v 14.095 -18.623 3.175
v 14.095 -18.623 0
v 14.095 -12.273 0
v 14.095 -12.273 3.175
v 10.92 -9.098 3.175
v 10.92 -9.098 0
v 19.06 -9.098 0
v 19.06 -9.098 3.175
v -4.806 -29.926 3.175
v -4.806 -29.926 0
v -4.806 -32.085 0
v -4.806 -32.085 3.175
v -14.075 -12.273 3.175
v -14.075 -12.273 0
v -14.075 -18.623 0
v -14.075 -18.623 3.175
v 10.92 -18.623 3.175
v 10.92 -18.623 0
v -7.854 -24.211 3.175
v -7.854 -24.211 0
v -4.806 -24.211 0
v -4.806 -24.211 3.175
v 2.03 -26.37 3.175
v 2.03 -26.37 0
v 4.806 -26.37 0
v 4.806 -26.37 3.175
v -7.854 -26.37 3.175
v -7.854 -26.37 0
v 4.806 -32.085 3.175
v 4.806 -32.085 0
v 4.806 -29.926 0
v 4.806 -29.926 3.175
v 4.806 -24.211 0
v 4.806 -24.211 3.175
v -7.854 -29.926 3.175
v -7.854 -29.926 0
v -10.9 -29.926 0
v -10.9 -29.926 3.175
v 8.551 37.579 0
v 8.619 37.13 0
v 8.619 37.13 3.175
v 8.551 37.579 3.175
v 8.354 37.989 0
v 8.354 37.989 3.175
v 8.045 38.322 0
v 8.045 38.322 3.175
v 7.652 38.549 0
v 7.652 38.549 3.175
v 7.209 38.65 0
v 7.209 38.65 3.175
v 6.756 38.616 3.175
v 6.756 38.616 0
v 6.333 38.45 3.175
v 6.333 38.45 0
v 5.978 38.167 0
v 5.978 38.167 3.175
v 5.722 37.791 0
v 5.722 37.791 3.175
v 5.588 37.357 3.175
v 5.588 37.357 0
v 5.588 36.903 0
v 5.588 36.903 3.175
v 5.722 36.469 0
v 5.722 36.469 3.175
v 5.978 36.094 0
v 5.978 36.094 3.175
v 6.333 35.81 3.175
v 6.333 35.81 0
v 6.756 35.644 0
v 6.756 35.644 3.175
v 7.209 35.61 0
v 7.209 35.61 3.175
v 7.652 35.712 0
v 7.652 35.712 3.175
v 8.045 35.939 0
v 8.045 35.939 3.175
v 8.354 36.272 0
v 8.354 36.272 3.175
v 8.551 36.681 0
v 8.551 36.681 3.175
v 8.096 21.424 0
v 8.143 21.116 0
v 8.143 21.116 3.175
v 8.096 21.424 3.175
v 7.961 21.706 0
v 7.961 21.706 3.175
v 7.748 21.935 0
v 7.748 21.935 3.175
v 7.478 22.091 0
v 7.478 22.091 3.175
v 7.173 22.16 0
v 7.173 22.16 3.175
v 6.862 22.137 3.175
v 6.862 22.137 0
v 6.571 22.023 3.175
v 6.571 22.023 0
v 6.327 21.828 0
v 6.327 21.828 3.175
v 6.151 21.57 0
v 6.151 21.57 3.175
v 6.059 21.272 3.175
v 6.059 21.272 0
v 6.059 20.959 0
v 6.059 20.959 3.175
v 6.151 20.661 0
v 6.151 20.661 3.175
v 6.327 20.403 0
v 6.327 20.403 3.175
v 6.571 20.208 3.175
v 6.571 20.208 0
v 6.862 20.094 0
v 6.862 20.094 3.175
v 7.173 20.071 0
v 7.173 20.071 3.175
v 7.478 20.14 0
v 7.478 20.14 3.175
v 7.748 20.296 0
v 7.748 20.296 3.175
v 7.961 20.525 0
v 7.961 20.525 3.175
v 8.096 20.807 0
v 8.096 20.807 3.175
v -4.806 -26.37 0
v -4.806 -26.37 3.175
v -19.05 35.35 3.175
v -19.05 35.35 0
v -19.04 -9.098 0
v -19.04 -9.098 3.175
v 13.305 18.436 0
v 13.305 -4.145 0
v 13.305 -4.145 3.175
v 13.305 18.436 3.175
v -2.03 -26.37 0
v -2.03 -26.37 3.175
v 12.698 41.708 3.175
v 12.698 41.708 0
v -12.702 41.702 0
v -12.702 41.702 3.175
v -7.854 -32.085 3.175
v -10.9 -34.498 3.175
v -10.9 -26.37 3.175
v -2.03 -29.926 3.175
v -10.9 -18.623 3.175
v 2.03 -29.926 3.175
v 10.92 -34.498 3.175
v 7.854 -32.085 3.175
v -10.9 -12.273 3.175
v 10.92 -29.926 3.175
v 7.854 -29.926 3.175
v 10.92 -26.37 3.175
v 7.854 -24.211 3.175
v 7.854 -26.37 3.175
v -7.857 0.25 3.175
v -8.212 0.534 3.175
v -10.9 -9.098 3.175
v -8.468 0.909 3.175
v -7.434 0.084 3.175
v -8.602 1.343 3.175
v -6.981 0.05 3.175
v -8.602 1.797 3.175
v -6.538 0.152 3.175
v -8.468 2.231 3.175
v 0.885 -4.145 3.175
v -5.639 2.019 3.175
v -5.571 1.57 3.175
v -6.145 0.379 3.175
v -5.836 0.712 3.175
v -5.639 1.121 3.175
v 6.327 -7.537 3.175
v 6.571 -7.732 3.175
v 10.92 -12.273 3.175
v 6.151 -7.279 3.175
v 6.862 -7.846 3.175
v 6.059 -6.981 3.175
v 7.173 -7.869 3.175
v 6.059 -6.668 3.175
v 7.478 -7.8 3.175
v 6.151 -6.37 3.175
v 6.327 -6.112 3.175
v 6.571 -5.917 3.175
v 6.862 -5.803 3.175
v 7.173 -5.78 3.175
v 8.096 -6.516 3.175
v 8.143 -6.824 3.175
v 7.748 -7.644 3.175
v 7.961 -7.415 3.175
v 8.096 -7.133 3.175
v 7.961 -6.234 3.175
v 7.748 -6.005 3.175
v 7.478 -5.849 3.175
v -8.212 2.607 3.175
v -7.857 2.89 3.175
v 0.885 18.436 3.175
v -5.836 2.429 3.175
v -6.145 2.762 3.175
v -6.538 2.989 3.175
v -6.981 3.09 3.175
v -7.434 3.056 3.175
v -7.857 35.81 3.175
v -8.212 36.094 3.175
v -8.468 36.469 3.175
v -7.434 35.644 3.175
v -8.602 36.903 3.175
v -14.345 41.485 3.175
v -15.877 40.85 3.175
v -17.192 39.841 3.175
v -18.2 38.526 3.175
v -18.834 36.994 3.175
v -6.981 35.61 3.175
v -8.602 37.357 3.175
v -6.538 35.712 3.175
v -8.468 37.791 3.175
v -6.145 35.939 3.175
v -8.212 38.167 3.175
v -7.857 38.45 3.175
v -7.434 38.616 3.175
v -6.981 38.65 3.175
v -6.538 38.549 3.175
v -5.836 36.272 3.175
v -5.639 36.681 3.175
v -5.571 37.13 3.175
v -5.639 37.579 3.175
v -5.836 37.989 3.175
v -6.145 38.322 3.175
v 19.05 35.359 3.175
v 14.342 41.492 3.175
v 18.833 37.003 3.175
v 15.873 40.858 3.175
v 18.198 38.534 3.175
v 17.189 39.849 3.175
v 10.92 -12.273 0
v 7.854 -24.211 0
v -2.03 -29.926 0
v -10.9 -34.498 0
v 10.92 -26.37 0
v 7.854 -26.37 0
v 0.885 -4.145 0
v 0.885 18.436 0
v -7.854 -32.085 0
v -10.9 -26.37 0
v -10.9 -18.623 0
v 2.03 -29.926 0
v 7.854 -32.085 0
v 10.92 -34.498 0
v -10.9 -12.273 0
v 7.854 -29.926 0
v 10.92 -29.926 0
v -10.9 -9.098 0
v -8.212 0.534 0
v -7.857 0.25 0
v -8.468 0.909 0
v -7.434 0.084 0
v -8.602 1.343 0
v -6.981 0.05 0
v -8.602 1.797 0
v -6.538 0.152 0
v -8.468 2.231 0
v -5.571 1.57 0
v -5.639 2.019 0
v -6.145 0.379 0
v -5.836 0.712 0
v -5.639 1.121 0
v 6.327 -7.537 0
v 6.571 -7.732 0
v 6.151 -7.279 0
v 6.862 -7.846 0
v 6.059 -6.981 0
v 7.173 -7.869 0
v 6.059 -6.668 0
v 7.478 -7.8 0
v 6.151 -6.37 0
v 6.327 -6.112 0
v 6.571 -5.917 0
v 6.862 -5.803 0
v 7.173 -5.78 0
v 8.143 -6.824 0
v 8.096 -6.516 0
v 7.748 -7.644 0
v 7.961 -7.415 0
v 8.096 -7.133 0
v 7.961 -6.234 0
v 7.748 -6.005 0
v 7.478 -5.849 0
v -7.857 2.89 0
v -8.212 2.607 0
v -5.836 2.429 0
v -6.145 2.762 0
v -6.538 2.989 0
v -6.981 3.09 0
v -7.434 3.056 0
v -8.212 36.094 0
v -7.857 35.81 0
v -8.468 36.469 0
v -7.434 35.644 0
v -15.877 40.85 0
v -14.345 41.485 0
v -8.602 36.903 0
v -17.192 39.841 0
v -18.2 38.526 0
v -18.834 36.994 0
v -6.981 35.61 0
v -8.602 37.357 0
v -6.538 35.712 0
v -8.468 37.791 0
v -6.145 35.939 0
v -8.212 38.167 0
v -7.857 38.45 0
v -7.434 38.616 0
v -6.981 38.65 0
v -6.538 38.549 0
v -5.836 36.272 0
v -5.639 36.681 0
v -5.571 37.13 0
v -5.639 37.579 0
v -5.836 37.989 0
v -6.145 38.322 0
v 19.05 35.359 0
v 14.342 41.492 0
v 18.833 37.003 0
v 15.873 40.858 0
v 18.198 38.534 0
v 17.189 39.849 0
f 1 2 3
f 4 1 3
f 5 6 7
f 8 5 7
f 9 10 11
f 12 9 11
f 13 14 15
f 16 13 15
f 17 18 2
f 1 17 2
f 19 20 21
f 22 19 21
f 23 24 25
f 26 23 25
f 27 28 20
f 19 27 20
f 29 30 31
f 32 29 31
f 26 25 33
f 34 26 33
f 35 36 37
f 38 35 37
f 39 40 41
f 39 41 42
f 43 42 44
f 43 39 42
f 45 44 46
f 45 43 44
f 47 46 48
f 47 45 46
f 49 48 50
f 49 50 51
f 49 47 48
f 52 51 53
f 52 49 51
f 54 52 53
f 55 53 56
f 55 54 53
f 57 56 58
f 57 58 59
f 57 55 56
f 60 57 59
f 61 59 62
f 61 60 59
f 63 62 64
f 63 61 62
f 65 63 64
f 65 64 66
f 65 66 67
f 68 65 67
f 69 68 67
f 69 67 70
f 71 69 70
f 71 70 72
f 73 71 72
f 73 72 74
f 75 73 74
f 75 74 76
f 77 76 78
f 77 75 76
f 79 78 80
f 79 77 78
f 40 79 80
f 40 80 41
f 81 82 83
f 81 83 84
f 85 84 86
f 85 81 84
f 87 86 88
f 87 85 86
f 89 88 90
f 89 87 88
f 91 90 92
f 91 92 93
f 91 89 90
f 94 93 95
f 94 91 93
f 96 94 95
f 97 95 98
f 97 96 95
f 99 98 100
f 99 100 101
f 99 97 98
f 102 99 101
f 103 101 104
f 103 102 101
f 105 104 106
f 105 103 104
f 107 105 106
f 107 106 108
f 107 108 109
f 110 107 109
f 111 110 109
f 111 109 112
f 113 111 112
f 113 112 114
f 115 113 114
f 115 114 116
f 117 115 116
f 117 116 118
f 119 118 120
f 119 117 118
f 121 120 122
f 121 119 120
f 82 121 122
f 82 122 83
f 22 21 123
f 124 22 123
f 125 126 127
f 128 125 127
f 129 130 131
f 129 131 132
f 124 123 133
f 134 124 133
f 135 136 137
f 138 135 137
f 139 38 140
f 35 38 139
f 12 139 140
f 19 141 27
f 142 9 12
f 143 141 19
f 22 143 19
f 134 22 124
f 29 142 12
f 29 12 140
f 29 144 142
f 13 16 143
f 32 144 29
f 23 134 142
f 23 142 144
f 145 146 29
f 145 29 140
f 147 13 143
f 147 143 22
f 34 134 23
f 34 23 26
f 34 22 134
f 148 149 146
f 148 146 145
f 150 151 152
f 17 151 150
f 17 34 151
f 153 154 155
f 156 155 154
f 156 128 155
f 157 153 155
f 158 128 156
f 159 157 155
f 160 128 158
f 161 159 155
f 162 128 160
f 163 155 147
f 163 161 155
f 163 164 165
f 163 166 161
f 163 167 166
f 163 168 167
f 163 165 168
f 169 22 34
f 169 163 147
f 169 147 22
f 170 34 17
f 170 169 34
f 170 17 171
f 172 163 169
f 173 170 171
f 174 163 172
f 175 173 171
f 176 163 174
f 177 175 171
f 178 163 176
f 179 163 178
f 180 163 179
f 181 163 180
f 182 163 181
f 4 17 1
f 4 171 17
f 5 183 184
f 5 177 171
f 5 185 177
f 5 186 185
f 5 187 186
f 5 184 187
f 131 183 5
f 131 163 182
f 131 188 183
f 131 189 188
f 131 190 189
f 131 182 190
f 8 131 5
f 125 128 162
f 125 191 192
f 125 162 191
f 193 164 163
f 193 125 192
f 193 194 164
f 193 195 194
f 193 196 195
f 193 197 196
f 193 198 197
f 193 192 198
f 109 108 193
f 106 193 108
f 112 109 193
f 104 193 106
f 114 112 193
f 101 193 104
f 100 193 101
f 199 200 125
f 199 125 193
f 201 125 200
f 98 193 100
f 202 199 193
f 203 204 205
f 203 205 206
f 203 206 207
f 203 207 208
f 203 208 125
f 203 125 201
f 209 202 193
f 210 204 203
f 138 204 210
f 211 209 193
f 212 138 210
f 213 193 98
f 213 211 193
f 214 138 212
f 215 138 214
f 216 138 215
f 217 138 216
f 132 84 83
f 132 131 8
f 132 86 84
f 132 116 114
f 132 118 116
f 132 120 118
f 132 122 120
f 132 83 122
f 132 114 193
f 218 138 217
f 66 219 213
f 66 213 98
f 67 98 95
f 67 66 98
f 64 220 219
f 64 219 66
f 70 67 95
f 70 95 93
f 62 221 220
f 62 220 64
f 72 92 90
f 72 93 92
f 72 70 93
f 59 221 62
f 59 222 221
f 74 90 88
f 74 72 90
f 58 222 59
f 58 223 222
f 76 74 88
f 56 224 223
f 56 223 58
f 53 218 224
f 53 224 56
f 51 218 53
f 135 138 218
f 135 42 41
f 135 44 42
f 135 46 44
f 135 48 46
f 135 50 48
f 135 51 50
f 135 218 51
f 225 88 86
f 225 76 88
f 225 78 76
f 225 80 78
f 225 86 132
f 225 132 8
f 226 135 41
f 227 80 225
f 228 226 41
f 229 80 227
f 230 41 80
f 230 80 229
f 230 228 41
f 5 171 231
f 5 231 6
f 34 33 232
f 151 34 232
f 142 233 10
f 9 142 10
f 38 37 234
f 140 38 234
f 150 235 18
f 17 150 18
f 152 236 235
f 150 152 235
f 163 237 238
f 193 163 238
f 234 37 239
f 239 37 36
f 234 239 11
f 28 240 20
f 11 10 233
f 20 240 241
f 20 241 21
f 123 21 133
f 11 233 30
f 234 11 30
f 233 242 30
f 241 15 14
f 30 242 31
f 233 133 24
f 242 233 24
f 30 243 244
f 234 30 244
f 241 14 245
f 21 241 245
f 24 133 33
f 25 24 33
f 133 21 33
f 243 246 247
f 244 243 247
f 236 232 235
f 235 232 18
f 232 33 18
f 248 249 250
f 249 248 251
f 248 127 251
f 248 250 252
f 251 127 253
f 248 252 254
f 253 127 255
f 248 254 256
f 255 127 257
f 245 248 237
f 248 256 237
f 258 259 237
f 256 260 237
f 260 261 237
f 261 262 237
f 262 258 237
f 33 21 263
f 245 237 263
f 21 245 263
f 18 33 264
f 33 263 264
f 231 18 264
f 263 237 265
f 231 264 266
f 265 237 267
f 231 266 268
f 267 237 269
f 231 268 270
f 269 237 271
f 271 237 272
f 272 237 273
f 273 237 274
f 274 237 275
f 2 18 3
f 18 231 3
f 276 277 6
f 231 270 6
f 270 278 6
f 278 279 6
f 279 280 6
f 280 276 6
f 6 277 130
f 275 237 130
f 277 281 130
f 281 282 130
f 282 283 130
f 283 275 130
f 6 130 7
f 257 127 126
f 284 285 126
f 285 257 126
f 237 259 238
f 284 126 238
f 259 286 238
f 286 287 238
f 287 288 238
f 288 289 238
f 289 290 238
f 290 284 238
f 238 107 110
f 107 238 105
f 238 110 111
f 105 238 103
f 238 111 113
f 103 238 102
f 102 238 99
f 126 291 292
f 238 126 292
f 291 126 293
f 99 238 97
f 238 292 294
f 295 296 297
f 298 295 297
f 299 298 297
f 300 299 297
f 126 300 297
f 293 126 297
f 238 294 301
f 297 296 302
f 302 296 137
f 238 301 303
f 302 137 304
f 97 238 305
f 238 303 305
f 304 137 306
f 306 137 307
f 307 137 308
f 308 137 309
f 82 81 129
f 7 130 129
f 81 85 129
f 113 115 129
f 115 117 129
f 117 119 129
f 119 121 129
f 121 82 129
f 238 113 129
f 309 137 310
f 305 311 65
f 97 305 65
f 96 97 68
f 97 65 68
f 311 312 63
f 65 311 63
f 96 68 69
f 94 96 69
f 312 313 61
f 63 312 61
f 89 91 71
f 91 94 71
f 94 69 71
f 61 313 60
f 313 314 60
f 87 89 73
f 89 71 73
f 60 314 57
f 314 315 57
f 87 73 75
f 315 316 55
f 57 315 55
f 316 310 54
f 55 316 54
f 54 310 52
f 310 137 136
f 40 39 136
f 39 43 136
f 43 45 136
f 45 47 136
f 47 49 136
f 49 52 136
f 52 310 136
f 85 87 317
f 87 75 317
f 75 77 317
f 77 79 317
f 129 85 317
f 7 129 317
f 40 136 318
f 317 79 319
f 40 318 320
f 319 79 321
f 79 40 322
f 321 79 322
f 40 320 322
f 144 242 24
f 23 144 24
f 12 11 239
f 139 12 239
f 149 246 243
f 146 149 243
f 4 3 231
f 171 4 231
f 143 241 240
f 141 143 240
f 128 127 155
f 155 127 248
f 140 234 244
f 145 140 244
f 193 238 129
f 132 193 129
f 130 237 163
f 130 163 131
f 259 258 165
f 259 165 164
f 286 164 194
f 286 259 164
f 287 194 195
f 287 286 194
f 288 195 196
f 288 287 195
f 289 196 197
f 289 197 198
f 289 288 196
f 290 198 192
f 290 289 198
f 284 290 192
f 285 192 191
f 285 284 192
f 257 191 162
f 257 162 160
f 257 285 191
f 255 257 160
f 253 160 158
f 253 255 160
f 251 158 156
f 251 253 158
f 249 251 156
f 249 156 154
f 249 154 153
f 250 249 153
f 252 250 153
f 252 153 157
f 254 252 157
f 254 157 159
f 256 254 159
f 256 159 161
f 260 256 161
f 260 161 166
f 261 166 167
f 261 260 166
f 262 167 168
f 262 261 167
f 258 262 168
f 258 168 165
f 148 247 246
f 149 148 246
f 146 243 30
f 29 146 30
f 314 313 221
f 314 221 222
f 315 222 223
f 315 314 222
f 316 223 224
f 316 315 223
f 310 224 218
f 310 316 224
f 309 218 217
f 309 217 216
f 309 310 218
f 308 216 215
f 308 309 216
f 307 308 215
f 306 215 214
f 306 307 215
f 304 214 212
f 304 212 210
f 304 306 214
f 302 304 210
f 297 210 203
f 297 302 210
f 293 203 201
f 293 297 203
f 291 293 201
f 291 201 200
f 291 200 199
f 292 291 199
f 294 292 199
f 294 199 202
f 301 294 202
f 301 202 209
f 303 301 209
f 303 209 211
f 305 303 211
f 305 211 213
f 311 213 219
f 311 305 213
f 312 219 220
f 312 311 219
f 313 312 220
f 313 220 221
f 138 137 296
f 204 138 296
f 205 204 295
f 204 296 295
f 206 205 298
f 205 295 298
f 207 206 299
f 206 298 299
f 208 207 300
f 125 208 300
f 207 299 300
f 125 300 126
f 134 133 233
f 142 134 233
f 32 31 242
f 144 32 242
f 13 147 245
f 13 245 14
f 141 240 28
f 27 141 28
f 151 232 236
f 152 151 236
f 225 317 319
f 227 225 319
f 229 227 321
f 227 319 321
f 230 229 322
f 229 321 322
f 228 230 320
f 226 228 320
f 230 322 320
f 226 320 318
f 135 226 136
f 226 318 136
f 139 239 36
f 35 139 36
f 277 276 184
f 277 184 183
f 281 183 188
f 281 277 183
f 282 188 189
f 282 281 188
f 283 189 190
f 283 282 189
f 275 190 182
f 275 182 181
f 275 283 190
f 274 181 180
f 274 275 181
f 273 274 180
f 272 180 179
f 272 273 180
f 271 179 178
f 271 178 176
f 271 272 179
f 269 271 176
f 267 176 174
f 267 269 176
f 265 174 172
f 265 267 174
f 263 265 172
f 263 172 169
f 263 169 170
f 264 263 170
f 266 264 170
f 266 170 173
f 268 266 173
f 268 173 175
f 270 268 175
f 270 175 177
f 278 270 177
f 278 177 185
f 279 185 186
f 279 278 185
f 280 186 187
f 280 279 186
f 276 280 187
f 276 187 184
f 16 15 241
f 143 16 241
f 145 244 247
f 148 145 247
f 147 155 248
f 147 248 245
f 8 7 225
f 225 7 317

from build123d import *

# Parameters (mm, degrees)
F0_R     = 1.524
F0_R_2   = 1.04775
F0_W     = 12.4206
F0_H     = 22.5806
F1_DEPTH = 3.175


# Not quite as in the source:
# - ends of sketch curves that miss each other by under 0.0002 mm in the source are joined
# - a length typed as a fraction of an inch, garbled in the dataset ("3 / 203.2 mm" for 3/8 in), is restored


with BuildPart() as f1:
    # F0 (on Top) → F1 (new body)
    with BuildSketch(Plane.XY):
        with BuildLine():
            ThreePointArc((19.0496193061, 35.359281088), (17.1886928512, 39.8489739211), (12.6981263868, 41.7077912426))
            Line((12.6981263868, 41.7077912426), (-12.7018729111, 41.7018188664))
            ThreePointArc((-12.7018729111, 41.7018188664), (-17.19156232, 39.8408924124), (-19.0503796423, 35.3503293721))
            Line((-19.0503796423, 35.3503293721), (-19.0399523971, -9.0977780687))
            Line((-19.0399523971, -9.0977780687), (-10.8996863639, -9.0977780687))
            Line((-10.8996863639, -9.0977780687), (-10.8996863639, -12.2727780687))
            Line((-10.8996863639, -12.2727780687), (-14.0746863639, -12.2727780687))
            Line((-14.0746863639, -12.2727780687), (-14.0746863639, -18.6227780687))
            Line((-14.0746863639, -18.6227780687), (-10.8996939729, -18.6227780687))
            Line((-10.8996939729, -18.6227780687), (-10.8996939729, -26.3697780687))
            Line((-10.8996939729, -26.3697780687), (-7.8538059598, -26.3697780687))
            Line((-7.8538059598, -26.3697780687), (-7.8538059598, -24.2107780687))
            Line((-7.8538059598, -24.2107780687), (-4.8058059598, -24.2107780687))
            Line((-4.8058059598, -24.2107780687), (-4.8058059598, -26.3697780687))
            Line((-4.8058059598, -26.3697780687), (-2.0297826182, -26.3697780687))
            Line((-2.0297826182, -26.3697780687), (-2.0297826182, -29.9257780687))
            Line((-2.0297826182, -29.9257780687), (-4.8058059598, -29.9257780687))
            Line((-4.8058059598, -29.9257780687), (-4.8058059598, -32.0847780687))
            Line((-4.8058059598, -32.0847780687), (-7.8538059598, -32.0847780687))
            Line((-7.8538059598, -32.0847780687), (-7.8538059598, -29.9257780687))
            Line((-7.8538059598, -29.9257780687), (-10.8996939729, -29.9257780687))
            Line((-10.8996939729, -29.9257780687), (-10.8996939729, -34.4977780687))
            Line((-10.8996939729, -34.4977780687), (10.9197826182, -34.4977780687))
            Line((10.9197826182, -34.4977780687), (10.9197826182, -29.9257780687))
            Line((10.9197826182, -29.9257780687), (7.8538059598, -29.9257780687))
            Line((7.8538059598, -29.9257780687), (7.8538059598, -32.0847780687))
            Line((7.8538059598, -32.0847780687), (4.8058059598, -32.0847780687))
            Line((4.8058059598, -32.0847780687), (4.8058059598, -29.9257780687))
            Line((4.8058059598, -29.9257780687), (2.0297826182, -29.9257780687))
            Line((2.0297826182, -29.9257780687), (2.0297826182, -26.3697780687))
            Line((2.0297826182, -26.3697780687), (4.8058059598, -26.3697780687))
            Line((4.8058059598, -26.3697780687), (4.8058059598, -24.2107780687))
            Line((4.8058059598, -24.2107780687), (7.8538059598, -24.2107780687))
            Line((7.8538059598, -24.2107780687), (7.8538059598, -26.3697780687))
            Line((7.8538059598, -26.3697780687), (10.9197826182, -26.3697780687))
            Line((10.9197826182, -26.3697780687), (10.9197826182, -18.6227780687))
            Line((10.9197826182, -18.6227780687), (14.0947826182, -18.6227780687))
            Line((14.0947826182, -18.6227780687), (14.0947826182, -12.2727780687))
            Line((14.0947826182, -12.2727780687), (10.9197826182, -12.2727780687))
            Line((10.9197826182, -12.2727780687), (10.9197826182, -9.0977780687))
            Line((10.9197826182, -9.0977780687), (19.0600486513, -9.0977780687))
            Line((19.0600486513, -9.0977780687), (19.0496193061, 35.359281088))
        make_face()
        with Locations((-7.0950099938, 1.5702219313)):
            Circle(F0_R, mode=Mode.SUBTRACT)
        with Locations((7.0950099938, -6.8244780687)):
            Circle(F0_R_2, mode=Mode.SUBTRACT)
        with Locations((-7.0950099938, 37.1302219313)):
            Circle(F0_R, mode=Mode.SUBTRACT)
        with Locations((7.0950099938, 7.1455219313)):
            Rectangle(F0_W, F0_H, mode=Mode.SUBTRACT)
        with Locations((7.0950099938, 21.1155219313)):
            Circle(F0_R_2, mode=Mode.SUBTRACT)
        with Locations((7.0950099938, 37.1302219313)):
            Circle(F0_R, mode=Mode.SUBTRACT)
    extrude(amount=F1_DEPTH)


solid = f1.part
